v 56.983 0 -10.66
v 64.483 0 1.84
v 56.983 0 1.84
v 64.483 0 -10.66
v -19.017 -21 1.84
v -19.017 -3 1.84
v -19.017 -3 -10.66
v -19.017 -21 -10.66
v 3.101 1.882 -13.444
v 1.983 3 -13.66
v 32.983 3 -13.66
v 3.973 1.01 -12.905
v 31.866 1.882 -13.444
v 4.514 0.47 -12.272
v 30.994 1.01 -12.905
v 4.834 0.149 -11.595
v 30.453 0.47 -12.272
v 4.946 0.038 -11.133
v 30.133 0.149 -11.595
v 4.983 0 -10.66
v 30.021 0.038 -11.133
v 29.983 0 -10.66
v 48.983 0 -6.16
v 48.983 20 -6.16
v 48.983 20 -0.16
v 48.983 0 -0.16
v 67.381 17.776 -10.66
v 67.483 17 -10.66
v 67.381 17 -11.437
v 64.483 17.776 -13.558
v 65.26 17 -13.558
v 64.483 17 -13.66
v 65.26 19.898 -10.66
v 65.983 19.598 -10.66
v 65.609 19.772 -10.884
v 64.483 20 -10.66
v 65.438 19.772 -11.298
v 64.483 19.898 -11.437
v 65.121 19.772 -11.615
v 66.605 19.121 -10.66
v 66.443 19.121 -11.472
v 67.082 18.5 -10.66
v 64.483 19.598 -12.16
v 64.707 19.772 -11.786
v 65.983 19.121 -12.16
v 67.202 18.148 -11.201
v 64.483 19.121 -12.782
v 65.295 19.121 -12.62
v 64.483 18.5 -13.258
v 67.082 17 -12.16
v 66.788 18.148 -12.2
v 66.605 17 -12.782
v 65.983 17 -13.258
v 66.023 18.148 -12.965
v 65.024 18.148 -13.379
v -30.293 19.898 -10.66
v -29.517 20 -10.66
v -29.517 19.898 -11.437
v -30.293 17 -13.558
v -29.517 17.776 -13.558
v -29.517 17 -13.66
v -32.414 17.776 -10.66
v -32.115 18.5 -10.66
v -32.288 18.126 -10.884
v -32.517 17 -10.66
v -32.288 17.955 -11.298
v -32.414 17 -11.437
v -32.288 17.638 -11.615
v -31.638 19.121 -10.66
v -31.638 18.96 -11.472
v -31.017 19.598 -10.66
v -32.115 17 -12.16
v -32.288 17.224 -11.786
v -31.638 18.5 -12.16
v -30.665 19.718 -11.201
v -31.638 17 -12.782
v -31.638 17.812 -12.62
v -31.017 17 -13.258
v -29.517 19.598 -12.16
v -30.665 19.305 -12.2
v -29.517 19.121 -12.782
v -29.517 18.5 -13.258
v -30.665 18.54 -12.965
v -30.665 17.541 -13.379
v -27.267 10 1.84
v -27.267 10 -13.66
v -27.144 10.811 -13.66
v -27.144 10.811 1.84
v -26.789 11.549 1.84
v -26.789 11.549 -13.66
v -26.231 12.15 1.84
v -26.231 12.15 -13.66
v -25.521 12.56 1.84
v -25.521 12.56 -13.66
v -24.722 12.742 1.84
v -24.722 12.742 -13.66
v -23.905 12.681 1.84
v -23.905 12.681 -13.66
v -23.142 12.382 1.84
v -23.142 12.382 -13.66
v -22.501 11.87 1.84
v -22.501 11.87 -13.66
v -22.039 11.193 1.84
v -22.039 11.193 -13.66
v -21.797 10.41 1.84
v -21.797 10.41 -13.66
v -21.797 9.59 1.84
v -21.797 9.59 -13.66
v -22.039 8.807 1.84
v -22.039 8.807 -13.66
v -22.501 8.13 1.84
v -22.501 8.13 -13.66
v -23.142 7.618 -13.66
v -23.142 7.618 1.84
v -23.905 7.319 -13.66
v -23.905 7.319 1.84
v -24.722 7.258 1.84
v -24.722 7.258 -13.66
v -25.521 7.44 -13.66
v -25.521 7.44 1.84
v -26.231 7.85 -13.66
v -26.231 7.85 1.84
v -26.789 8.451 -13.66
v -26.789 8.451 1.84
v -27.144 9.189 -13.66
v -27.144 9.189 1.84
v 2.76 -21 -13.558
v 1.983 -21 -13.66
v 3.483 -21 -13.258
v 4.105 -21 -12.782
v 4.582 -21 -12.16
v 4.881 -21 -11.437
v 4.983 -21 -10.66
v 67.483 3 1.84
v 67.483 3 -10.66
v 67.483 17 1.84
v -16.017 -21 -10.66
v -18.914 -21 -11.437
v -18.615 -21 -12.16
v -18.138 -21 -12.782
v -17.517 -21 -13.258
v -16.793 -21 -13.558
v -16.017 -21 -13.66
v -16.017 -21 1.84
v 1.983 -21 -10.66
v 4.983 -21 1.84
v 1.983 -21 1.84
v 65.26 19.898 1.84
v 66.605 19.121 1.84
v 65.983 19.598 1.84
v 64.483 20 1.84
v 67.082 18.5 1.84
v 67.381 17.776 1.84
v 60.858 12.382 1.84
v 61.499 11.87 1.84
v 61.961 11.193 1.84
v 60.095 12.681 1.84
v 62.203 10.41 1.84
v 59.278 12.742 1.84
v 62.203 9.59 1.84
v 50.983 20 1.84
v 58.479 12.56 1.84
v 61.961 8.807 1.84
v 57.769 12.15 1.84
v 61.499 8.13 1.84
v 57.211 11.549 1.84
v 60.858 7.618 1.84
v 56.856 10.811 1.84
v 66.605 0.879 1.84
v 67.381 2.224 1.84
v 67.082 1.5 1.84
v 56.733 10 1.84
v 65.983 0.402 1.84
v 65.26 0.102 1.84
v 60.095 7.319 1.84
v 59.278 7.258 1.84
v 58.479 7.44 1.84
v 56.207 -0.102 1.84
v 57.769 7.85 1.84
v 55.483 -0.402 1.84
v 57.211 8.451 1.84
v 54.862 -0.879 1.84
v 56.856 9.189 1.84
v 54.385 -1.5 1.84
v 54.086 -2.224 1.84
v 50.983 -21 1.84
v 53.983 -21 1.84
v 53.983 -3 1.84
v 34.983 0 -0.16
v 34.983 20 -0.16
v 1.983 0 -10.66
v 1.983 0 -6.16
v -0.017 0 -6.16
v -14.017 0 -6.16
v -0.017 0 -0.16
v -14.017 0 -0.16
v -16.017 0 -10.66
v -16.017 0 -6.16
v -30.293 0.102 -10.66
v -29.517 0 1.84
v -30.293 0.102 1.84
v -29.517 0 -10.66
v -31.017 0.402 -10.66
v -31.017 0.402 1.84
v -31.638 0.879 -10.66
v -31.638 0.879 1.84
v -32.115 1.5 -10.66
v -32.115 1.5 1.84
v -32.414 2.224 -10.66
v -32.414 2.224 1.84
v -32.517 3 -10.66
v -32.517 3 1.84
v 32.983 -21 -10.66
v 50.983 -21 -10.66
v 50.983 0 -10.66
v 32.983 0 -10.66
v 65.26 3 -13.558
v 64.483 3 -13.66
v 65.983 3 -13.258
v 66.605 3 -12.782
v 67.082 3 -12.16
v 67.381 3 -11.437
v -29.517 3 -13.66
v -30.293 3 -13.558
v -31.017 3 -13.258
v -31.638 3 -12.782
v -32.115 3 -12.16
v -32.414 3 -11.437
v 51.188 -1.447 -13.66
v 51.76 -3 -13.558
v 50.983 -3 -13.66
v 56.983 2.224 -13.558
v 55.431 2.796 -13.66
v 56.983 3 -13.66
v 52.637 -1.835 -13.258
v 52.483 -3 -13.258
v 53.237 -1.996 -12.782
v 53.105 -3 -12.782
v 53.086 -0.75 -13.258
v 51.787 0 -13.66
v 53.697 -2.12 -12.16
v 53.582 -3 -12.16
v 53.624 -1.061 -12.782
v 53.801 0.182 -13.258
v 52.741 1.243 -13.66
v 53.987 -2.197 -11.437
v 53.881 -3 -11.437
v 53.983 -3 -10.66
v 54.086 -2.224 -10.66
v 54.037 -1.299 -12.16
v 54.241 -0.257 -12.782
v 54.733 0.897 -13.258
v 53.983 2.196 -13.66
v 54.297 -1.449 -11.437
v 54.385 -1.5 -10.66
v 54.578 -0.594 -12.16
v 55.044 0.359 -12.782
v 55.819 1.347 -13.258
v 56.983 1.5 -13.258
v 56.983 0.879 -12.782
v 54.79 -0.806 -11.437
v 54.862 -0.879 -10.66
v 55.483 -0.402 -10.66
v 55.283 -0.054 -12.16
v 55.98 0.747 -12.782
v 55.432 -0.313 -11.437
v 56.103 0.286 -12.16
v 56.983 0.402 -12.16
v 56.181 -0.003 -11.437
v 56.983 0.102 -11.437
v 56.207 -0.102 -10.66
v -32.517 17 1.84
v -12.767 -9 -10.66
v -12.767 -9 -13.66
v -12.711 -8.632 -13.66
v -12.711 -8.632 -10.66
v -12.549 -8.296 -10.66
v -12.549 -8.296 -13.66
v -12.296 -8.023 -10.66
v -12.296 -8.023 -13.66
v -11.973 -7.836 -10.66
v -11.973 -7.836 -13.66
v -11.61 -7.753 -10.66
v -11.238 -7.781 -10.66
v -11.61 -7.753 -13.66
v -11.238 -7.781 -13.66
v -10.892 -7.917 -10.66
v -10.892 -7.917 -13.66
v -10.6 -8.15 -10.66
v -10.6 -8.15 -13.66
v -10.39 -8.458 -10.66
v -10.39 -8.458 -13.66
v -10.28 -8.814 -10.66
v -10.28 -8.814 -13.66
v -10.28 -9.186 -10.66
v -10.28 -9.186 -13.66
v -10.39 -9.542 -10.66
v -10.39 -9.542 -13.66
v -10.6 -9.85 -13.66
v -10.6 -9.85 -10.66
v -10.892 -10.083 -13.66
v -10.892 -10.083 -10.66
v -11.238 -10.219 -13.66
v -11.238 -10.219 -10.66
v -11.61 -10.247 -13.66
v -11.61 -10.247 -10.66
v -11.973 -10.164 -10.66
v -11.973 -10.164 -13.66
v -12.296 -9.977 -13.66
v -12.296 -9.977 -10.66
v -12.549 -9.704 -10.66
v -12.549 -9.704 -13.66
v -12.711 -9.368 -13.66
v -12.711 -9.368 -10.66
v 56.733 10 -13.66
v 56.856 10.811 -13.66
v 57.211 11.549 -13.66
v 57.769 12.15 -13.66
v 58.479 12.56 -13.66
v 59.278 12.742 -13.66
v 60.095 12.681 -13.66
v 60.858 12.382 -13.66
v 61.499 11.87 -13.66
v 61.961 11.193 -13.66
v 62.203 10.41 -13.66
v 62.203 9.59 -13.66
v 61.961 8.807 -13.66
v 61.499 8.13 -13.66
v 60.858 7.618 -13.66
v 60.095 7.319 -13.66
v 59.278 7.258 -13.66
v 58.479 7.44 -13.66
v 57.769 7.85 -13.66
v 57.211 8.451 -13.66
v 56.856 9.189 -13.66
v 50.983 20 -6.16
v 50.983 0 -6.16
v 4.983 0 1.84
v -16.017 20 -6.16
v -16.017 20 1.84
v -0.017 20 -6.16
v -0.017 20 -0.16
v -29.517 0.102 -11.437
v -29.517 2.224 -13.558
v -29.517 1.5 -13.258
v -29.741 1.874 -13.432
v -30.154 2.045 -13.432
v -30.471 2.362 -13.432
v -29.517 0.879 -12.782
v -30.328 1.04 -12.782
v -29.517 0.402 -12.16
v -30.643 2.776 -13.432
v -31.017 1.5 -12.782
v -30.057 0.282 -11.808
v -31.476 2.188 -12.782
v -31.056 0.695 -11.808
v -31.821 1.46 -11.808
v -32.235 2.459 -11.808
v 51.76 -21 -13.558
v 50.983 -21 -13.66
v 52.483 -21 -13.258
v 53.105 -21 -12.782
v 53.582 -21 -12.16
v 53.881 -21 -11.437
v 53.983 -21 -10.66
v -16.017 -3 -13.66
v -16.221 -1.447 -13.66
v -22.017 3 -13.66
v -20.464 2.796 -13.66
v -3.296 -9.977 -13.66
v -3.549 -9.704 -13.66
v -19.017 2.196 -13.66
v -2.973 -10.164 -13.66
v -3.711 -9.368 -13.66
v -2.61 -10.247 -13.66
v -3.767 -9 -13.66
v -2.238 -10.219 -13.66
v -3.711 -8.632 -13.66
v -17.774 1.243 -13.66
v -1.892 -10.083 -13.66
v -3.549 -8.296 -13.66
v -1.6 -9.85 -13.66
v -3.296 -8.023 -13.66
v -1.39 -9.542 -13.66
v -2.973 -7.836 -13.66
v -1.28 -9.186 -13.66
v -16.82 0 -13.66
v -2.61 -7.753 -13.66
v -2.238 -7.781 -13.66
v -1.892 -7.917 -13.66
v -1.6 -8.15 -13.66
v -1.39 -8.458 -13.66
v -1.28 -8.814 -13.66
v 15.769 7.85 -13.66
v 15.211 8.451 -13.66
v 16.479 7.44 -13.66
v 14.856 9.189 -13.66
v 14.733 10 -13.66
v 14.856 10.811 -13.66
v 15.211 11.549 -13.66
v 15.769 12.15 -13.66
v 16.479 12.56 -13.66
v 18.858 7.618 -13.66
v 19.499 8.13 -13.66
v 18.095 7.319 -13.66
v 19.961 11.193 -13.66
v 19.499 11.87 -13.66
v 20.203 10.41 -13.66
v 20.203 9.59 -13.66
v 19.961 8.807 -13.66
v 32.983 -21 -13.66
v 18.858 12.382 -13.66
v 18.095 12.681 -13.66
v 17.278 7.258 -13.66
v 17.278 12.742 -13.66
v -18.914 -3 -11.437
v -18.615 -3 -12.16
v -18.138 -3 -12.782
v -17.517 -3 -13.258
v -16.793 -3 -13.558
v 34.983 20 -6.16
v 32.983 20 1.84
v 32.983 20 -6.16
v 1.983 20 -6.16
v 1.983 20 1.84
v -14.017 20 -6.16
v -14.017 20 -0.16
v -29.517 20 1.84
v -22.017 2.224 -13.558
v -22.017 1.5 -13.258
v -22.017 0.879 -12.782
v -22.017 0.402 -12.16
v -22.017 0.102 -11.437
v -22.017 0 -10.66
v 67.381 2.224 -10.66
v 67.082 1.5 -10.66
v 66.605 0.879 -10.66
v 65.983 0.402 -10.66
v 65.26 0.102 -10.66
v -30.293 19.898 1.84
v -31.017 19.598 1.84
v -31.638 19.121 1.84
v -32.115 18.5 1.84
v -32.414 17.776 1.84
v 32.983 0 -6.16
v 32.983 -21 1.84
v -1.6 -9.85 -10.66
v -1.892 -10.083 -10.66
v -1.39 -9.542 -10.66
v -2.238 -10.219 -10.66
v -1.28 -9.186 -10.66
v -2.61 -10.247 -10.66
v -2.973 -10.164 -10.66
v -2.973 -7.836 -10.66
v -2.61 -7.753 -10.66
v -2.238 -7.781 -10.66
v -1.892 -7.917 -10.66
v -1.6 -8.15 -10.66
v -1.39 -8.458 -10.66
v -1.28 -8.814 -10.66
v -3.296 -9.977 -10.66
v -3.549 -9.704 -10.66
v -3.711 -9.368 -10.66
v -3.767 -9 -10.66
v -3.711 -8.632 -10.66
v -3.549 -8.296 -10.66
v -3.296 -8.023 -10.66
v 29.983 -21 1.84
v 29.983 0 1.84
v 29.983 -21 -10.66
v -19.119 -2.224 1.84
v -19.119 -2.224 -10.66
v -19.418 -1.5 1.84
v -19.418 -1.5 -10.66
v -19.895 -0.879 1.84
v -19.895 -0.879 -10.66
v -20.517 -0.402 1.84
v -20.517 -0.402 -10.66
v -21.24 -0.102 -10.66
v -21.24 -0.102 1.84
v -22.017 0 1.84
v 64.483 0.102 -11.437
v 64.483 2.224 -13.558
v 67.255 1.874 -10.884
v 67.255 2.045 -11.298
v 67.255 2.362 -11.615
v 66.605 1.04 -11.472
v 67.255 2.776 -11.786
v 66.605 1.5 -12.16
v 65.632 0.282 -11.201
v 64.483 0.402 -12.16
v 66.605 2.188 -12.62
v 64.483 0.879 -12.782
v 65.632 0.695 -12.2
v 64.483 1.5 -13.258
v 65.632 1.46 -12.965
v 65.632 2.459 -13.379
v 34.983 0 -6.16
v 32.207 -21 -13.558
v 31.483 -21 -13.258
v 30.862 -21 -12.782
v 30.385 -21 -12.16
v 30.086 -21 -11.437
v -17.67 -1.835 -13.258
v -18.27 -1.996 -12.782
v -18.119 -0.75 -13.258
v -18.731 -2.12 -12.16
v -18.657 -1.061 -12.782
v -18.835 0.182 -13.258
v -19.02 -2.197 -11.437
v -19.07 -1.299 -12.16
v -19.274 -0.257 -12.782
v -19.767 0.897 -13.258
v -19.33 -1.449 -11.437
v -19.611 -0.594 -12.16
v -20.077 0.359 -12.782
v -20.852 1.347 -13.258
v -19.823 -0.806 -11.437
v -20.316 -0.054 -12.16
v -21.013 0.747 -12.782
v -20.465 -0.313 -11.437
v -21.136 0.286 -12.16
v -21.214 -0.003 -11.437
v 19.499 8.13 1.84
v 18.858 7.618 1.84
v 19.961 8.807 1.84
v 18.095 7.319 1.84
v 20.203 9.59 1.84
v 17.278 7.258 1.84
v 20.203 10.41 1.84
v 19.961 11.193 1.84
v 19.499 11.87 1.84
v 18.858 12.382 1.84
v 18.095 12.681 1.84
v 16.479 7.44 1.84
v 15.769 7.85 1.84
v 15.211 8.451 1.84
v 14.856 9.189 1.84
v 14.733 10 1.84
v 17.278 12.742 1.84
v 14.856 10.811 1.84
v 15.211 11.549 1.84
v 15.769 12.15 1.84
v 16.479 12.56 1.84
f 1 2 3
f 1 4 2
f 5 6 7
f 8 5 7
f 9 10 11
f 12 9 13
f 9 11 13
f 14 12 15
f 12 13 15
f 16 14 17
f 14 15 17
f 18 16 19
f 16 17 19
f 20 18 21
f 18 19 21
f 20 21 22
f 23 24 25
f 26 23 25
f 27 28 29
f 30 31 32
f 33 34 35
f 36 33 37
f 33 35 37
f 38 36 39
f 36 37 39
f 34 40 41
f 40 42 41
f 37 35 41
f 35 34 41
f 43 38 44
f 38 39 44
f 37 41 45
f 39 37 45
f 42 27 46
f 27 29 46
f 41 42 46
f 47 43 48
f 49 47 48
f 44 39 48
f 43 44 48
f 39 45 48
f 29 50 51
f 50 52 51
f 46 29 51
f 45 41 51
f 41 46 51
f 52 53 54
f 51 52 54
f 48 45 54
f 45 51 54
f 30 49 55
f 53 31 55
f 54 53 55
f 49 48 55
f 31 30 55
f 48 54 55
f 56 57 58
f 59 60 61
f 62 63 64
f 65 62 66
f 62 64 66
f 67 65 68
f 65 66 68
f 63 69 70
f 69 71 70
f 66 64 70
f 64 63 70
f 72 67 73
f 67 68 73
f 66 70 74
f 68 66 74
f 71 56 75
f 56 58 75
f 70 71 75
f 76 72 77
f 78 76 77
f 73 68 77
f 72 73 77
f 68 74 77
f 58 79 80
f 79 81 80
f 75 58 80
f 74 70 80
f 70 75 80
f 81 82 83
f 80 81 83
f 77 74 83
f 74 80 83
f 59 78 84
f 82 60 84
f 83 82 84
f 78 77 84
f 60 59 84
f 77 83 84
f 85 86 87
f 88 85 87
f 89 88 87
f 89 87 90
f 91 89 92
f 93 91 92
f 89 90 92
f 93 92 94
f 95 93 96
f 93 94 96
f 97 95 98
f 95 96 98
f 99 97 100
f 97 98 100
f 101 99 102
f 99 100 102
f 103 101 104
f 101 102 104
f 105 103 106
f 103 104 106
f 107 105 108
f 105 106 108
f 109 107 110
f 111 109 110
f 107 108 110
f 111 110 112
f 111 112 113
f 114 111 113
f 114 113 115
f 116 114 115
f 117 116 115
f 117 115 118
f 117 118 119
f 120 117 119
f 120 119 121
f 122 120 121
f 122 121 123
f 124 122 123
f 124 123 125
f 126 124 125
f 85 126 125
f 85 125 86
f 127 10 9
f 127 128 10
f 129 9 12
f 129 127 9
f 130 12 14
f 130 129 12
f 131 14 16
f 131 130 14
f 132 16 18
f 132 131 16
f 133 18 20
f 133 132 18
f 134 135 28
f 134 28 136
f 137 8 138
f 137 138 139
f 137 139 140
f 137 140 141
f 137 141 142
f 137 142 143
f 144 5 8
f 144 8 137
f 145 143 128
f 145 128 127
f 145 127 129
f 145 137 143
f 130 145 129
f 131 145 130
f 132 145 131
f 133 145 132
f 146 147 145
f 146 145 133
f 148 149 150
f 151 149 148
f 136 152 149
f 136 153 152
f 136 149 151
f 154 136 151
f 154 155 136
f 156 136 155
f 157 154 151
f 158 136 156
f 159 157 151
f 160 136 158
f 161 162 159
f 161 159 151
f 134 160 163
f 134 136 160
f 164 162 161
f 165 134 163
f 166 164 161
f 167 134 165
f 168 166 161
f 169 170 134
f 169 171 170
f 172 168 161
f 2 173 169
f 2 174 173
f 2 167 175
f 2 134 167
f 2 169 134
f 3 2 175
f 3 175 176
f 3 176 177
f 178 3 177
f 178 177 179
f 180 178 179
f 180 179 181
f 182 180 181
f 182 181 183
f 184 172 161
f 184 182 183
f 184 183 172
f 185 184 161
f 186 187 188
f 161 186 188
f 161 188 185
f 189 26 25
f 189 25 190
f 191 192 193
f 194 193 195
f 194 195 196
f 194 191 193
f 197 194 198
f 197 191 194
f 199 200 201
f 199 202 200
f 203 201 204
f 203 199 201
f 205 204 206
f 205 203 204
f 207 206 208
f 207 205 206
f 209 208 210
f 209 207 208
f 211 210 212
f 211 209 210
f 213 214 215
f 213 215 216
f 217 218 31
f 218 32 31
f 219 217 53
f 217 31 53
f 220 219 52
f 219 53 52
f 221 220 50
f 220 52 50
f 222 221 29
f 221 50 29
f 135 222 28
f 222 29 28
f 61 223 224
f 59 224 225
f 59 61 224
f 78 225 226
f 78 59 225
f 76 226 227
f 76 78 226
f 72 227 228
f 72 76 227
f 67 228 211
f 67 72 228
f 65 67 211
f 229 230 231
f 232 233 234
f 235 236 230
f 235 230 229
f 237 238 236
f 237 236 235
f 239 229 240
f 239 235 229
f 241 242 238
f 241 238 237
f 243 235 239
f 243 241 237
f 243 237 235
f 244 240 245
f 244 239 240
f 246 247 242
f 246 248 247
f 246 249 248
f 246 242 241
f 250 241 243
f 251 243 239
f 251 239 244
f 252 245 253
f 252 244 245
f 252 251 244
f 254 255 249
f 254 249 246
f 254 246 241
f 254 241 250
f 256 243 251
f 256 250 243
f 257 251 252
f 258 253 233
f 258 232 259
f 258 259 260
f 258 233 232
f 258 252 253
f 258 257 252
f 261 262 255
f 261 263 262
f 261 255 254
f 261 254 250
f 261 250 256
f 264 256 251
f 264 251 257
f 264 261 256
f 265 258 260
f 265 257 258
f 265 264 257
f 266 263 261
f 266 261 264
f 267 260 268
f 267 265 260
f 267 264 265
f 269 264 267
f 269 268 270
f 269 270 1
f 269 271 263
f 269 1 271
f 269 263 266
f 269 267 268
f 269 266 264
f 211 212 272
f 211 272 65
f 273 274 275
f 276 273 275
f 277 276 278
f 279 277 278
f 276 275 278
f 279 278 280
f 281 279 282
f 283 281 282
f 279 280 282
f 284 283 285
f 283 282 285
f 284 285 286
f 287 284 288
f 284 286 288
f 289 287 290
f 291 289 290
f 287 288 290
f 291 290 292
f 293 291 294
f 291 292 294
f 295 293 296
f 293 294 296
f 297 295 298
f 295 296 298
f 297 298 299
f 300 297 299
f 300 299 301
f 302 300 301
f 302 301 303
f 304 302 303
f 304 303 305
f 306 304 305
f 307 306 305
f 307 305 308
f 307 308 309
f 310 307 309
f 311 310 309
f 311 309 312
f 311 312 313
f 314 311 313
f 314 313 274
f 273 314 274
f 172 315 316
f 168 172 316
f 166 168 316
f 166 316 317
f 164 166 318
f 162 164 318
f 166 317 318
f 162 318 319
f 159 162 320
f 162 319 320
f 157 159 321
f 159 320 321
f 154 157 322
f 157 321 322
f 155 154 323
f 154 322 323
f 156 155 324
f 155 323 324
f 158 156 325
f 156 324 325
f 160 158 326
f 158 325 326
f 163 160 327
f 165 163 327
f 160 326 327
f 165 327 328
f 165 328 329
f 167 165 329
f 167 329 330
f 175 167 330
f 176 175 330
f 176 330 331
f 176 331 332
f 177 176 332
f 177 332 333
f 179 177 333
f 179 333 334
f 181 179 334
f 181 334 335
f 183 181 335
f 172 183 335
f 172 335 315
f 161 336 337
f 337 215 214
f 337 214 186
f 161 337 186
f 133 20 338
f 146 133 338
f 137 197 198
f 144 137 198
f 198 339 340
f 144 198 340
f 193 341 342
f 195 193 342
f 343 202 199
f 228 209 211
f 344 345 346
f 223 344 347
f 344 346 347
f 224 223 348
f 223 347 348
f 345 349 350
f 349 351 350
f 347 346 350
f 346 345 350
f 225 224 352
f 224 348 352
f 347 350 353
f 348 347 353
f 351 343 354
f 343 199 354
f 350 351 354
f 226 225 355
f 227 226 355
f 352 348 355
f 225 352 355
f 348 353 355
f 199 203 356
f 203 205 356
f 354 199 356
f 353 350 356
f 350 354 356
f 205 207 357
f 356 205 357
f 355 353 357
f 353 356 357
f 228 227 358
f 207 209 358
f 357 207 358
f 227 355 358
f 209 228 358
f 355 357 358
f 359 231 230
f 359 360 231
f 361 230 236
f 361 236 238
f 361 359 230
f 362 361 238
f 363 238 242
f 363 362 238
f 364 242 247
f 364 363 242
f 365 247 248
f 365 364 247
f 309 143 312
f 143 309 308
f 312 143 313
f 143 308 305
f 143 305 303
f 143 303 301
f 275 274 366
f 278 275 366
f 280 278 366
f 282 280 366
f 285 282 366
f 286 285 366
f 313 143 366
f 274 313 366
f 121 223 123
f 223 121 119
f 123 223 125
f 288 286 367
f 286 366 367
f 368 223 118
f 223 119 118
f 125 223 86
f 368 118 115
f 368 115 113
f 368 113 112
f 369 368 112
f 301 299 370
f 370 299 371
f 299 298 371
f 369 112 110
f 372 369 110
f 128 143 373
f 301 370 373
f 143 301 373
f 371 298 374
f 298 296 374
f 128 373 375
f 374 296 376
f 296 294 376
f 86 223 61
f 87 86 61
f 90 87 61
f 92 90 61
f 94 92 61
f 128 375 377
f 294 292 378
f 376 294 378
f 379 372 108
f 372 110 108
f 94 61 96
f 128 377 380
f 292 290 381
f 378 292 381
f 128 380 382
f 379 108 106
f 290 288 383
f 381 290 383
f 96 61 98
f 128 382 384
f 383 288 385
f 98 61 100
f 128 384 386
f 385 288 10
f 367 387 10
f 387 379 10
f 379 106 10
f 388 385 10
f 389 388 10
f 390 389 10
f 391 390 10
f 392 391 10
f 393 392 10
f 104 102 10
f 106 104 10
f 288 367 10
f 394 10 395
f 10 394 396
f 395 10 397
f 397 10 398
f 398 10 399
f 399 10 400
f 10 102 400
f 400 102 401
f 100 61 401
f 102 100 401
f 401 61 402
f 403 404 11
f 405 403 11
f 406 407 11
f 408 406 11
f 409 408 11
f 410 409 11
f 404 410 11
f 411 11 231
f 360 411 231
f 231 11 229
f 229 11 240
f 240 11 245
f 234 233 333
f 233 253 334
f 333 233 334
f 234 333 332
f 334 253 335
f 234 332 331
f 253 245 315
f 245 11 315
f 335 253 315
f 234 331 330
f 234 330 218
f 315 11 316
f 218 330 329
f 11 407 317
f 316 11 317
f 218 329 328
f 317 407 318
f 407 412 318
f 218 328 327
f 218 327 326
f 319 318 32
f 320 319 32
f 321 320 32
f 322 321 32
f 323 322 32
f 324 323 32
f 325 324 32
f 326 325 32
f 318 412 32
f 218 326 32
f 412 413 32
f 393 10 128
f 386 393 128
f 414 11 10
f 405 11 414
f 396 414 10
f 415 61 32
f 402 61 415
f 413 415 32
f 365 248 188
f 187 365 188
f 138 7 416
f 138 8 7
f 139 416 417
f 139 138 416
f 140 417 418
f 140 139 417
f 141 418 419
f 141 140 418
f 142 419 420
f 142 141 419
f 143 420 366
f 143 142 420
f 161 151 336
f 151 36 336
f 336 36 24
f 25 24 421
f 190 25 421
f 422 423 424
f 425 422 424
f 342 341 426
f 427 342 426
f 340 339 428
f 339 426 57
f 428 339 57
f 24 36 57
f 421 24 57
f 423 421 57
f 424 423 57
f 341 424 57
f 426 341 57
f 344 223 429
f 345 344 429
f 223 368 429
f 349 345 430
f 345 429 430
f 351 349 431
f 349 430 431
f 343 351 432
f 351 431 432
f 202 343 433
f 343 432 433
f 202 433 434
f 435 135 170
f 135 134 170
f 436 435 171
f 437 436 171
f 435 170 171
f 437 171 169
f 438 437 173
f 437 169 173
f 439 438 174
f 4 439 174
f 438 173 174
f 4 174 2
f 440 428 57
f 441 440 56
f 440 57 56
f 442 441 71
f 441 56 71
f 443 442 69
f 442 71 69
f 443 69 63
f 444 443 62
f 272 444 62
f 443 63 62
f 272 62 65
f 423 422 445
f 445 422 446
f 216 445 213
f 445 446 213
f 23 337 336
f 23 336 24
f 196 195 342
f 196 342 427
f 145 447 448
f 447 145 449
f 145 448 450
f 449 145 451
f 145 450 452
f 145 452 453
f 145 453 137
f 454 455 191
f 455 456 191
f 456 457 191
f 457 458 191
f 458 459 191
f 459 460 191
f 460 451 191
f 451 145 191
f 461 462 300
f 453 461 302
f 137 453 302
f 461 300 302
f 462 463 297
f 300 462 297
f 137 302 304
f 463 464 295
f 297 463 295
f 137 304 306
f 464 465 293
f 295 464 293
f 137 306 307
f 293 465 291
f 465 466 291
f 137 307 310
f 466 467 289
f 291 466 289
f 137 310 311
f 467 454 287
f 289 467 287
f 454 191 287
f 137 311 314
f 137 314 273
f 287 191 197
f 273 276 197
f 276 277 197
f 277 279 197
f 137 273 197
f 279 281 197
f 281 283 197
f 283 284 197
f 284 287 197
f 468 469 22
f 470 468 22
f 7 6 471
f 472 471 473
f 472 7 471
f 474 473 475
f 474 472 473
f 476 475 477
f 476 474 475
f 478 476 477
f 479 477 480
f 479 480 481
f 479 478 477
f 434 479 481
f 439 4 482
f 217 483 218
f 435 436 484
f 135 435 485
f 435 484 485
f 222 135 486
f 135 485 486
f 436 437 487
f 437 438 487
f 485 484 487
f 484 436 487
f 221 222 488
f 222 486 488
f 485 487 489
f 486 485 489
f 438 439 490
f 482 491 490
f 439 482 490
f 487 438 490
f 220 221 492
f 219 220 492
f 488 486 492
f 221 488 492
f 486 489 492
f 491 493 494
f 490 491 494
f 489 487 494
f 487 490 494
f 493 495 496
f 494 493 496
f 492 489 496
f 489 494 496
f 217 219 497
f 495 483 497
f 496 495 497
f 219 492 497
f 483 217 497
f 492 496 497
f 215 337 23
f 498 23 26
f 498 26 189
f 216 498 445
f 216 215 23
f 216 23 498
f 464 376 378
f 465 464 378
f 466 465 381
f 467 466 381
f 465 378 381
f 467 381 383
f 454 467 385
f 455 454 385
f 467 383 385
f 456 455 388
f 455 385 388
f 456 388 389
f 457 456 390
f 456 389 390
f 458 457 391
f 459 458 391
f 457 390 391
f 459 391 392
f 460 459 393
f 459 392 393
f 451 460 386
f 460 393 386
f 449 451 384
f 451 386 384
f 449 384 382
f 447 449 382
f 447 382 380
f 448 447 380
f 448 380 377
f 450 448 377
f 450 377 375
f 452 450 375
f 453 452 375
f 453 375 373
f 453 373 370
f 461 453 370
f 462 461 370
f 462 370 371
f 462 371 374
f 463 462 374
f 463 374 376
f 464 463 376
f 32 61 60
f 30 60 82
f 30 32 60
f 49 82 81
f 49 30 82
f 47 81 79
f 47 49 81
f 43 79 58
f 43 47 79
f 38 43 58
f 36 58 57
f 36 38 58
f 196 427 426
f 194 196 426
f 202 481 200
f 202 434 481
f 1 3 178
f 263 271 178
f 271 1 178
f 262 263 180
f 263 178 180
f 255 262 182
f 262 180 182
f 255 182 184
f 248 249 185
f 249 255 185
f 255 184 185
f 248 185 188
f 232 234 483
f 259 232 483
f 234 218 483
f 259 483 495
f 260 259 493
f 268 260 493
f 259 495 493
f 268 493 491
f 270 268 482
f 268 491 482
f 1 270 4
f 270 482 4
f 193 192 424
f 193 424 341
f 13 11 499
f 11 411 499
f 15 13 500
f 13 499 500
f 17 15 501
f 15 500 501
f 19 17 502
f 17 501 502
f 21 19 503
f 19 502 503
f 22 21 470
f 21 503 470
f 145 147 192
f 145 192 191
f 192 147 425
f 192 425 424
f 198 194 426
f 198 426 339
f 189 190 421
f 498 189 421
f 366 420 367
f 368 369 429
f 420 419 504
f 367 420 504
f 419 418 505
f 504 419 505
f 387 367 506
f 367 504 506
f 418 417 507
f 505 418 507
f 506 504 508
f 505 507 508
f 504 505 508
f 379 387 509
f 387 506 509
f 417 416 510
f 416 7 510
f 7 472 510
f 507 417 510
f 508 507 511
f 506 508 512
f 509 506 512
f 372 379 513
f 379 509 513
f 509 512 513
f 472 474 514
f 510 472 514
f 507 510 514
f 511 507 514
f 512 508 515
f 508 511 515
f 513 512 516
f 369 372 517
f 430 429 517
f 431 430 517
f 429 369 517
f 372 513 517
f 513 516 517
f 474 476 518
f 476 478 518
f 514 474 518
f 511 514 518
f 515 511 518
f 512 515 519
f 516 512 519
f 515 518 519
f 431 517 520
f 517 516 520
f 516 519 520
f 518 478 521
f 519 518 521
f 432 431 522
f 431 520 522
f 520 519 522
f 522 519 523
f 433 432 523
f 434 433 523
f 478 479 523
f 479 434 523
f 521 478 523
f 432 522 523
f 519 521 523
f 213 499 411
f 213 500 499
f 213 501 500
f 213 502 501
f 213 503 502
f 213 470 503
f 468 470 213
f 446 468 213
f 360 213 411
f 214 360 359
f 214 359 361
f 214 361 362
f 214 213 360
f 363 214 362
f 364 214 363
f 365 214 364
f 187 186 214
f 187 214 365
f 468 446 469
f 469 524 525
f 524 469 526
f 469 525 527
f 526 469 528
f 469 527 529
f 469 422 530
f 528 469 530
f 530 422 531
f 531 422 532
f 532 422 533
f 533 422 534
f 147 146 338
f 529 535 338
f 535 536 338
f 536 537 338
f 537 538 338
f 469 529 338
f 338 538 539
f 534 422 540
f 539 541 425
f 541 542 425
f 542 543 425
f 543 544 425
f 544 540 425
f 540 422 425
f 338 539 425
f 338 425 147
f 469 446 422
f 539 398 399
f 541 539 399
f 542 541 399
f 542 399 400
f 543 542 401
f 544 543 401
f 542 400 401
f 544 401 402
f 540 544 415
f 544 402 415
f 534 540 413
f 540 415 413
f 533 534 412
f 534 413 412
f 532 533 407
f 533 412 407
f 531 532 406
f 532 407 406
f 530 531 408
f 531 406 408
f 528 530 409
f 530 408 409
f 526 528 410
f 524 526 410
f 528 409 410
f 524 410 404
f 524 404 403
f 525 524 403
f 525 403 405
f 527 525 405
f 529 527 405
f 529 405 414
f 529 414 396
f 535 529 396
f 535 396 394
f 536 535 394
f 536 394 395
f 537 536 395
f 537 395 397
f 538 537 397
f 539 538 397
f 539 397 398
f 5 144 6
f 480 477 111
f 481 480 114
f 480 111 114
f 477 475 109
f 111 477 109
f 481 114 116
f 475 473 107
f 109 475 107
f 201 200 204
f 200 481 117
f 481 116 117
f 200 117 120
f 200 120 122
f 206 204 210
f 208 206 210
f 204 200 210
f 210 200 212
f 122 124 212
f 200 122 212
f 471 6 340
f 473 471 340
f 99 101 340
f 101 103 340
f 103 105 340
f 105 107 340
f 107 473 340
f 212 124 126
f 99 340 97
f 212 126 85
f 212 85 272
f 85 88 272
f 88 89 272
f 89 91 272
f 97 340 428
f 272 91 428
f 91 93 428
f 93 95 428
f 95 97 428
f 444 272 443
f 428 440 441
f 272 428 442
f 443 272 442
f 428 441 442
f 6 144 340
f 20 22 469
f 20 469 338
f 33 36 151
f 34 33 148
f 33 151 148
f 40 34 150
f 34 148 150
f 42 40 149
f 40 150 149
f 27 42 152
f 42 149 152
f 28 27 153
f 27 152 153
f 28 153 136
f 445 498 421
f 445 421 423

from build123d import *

# Parameters (mm, degrees)
BOSS_EXTRUDE1_DEPTH = 20
EXTRUDE_THIN3_DEPTH = 21
SKETCH3_R           = 2.75
CUT_EXTRUDE1_DEPTH  = 73.35515227
FILLET2_R           = 3
SKETCH4_R           = 1.25
CUT_EXTRUDE2_DEPTH  = 10


with BuildPart() as part:
    # Sketch1 → Boss-Extrude1 (new body)
    with BuildSketch(Plane(origin=(0, 0, 0), x_dir=(1, 0, 0), z_dir=(0, 1, 0))):
        Polygon((-32.516534914, -1.83981797), (-32.516534914, 13.66018203), (67.483465086, 13.66018203), (67.483465086, -1.83981797), (50.983465086, -1.83981797), (50.983465086, 1.63642231), (50.983465086, 6.16018203), (48.983465086, 6.16018203), (48.983465086, 0.16018203), (34.983465086, 0.16018203), (34.983465086, 6.16018203), (32.983465086, 6.16018203), (32.983465086, 1.63642231), (32.983465086, -1.83981797), (1.983465086, -1.83981797), (1.983465086, 1.63642231), (1.983465086, 6.16018203), (-0.016534914, 6.16018203), (-0.016534914, 0.16018203), (-14.016534914, 0.16018203), (-14.016534914, 6.16018203), (-16.016534914, 6.16018203), (-16.016534914, 1.63642231), (-16.016534914, -1.83981797), align=None)
    extrude(amount=BOSS_EXTRUDE1_DEPTH)

    # Sketch2 → Extrude-Thin3 (add)
    with BuildSketch(Plane.XZ):
        Polygon((-19.016534914, 1.83981797), (-19.016534914, -13.66018203), (4.983465086, -13.66018203), (4.983465086, 1.83981797), (1.983465086, 1.83981797), (1.983465086, -10.66018203), (-16.016534914, -10.66018203), (-16.016534914, 1.83981797), align=None)
        Polygon((50.983465086, 1.83981797), (50.983465086, -10.66018203), (32.983465086, -10.66018203), (32.983465086, 1.83981797), (29.983465086, 1.83981797), (29.983465086, -13.66018203), (53.983465086, -13.66018203), (53.983465086, 1.83981797), align=None)
    extrude(amount=EXTRUDE_THIN3_DEPTH)

    # Sketch3 → Cut-Extrude1 (cut, through all)
    with BuildSketch(Plane(origin=(0, 0, -13.66018203), x_dir=(-1, 0, 0), z_dir=(0, 0, -1))):
        with Locations((24.516534914, 10)):
            Circle(SKETCH3_R)
        with Locations((-59.483465086, 10)):
            Circle(SKETCH3_R)
        with Locations((-17.483465086, 10)):
            Circle(SKETCH3_R)
    extrude(amount=-CUT_EXTRUDE1_DEPTH, mode=Mode.SUBTRACT)

    # Fillet2
    fillet2_edges = [part.edges().sort_by_distance(p)[0] for p in [
        (17.483465086, 0, -13.66018203),
        (29.983465086, -10.5, -13.66018203),
        (53.983465086, -10.5, -13.66018203),
        (60.733465086, 0, -13.66018203),
        (67.483465086, 0, -5.91018203),
        (67.483465086, 10, -13.66018203),
        (67.483465086, 20, -5.91018203),
        (17.483465086, 20, -13.66018203),
        (-32.516534914, 20, -5.91018203),
        (-32.516534914, 0, -5.91018203),
        (-19.016534914, 0, -5.91018203),
        (4.983465086, -10.5, -13.66018203),
        (-19.016534914, -10.5, -13.66018203),
        (-25.766534914, 0, -13.66018203),
        (-32.516534914, 10, -13.66018203),
        (53.983465086, 0, -5.91018203),
    ]]
    fillet(fillet2_edges, radius=FILLET2_R)

    # Sketch4 → Cut-Extrude2 (cut)
    with BuildSketch(Plane(origin=(0, 0, -13.66018203), x_dir=(-1, 0, 0), z_dir=(0, 0, -1))):
        with Locations((2.516534914, -9)):
            Circle(SKETCH4_R)
        with Locations((11.516534914, -9)):
            Circle(SKETCH4_R)
    extrude(amount=-CUT_EXTRUDE2_DEPTH, mode=Mode.SUBTRACT)


solid = part.part
